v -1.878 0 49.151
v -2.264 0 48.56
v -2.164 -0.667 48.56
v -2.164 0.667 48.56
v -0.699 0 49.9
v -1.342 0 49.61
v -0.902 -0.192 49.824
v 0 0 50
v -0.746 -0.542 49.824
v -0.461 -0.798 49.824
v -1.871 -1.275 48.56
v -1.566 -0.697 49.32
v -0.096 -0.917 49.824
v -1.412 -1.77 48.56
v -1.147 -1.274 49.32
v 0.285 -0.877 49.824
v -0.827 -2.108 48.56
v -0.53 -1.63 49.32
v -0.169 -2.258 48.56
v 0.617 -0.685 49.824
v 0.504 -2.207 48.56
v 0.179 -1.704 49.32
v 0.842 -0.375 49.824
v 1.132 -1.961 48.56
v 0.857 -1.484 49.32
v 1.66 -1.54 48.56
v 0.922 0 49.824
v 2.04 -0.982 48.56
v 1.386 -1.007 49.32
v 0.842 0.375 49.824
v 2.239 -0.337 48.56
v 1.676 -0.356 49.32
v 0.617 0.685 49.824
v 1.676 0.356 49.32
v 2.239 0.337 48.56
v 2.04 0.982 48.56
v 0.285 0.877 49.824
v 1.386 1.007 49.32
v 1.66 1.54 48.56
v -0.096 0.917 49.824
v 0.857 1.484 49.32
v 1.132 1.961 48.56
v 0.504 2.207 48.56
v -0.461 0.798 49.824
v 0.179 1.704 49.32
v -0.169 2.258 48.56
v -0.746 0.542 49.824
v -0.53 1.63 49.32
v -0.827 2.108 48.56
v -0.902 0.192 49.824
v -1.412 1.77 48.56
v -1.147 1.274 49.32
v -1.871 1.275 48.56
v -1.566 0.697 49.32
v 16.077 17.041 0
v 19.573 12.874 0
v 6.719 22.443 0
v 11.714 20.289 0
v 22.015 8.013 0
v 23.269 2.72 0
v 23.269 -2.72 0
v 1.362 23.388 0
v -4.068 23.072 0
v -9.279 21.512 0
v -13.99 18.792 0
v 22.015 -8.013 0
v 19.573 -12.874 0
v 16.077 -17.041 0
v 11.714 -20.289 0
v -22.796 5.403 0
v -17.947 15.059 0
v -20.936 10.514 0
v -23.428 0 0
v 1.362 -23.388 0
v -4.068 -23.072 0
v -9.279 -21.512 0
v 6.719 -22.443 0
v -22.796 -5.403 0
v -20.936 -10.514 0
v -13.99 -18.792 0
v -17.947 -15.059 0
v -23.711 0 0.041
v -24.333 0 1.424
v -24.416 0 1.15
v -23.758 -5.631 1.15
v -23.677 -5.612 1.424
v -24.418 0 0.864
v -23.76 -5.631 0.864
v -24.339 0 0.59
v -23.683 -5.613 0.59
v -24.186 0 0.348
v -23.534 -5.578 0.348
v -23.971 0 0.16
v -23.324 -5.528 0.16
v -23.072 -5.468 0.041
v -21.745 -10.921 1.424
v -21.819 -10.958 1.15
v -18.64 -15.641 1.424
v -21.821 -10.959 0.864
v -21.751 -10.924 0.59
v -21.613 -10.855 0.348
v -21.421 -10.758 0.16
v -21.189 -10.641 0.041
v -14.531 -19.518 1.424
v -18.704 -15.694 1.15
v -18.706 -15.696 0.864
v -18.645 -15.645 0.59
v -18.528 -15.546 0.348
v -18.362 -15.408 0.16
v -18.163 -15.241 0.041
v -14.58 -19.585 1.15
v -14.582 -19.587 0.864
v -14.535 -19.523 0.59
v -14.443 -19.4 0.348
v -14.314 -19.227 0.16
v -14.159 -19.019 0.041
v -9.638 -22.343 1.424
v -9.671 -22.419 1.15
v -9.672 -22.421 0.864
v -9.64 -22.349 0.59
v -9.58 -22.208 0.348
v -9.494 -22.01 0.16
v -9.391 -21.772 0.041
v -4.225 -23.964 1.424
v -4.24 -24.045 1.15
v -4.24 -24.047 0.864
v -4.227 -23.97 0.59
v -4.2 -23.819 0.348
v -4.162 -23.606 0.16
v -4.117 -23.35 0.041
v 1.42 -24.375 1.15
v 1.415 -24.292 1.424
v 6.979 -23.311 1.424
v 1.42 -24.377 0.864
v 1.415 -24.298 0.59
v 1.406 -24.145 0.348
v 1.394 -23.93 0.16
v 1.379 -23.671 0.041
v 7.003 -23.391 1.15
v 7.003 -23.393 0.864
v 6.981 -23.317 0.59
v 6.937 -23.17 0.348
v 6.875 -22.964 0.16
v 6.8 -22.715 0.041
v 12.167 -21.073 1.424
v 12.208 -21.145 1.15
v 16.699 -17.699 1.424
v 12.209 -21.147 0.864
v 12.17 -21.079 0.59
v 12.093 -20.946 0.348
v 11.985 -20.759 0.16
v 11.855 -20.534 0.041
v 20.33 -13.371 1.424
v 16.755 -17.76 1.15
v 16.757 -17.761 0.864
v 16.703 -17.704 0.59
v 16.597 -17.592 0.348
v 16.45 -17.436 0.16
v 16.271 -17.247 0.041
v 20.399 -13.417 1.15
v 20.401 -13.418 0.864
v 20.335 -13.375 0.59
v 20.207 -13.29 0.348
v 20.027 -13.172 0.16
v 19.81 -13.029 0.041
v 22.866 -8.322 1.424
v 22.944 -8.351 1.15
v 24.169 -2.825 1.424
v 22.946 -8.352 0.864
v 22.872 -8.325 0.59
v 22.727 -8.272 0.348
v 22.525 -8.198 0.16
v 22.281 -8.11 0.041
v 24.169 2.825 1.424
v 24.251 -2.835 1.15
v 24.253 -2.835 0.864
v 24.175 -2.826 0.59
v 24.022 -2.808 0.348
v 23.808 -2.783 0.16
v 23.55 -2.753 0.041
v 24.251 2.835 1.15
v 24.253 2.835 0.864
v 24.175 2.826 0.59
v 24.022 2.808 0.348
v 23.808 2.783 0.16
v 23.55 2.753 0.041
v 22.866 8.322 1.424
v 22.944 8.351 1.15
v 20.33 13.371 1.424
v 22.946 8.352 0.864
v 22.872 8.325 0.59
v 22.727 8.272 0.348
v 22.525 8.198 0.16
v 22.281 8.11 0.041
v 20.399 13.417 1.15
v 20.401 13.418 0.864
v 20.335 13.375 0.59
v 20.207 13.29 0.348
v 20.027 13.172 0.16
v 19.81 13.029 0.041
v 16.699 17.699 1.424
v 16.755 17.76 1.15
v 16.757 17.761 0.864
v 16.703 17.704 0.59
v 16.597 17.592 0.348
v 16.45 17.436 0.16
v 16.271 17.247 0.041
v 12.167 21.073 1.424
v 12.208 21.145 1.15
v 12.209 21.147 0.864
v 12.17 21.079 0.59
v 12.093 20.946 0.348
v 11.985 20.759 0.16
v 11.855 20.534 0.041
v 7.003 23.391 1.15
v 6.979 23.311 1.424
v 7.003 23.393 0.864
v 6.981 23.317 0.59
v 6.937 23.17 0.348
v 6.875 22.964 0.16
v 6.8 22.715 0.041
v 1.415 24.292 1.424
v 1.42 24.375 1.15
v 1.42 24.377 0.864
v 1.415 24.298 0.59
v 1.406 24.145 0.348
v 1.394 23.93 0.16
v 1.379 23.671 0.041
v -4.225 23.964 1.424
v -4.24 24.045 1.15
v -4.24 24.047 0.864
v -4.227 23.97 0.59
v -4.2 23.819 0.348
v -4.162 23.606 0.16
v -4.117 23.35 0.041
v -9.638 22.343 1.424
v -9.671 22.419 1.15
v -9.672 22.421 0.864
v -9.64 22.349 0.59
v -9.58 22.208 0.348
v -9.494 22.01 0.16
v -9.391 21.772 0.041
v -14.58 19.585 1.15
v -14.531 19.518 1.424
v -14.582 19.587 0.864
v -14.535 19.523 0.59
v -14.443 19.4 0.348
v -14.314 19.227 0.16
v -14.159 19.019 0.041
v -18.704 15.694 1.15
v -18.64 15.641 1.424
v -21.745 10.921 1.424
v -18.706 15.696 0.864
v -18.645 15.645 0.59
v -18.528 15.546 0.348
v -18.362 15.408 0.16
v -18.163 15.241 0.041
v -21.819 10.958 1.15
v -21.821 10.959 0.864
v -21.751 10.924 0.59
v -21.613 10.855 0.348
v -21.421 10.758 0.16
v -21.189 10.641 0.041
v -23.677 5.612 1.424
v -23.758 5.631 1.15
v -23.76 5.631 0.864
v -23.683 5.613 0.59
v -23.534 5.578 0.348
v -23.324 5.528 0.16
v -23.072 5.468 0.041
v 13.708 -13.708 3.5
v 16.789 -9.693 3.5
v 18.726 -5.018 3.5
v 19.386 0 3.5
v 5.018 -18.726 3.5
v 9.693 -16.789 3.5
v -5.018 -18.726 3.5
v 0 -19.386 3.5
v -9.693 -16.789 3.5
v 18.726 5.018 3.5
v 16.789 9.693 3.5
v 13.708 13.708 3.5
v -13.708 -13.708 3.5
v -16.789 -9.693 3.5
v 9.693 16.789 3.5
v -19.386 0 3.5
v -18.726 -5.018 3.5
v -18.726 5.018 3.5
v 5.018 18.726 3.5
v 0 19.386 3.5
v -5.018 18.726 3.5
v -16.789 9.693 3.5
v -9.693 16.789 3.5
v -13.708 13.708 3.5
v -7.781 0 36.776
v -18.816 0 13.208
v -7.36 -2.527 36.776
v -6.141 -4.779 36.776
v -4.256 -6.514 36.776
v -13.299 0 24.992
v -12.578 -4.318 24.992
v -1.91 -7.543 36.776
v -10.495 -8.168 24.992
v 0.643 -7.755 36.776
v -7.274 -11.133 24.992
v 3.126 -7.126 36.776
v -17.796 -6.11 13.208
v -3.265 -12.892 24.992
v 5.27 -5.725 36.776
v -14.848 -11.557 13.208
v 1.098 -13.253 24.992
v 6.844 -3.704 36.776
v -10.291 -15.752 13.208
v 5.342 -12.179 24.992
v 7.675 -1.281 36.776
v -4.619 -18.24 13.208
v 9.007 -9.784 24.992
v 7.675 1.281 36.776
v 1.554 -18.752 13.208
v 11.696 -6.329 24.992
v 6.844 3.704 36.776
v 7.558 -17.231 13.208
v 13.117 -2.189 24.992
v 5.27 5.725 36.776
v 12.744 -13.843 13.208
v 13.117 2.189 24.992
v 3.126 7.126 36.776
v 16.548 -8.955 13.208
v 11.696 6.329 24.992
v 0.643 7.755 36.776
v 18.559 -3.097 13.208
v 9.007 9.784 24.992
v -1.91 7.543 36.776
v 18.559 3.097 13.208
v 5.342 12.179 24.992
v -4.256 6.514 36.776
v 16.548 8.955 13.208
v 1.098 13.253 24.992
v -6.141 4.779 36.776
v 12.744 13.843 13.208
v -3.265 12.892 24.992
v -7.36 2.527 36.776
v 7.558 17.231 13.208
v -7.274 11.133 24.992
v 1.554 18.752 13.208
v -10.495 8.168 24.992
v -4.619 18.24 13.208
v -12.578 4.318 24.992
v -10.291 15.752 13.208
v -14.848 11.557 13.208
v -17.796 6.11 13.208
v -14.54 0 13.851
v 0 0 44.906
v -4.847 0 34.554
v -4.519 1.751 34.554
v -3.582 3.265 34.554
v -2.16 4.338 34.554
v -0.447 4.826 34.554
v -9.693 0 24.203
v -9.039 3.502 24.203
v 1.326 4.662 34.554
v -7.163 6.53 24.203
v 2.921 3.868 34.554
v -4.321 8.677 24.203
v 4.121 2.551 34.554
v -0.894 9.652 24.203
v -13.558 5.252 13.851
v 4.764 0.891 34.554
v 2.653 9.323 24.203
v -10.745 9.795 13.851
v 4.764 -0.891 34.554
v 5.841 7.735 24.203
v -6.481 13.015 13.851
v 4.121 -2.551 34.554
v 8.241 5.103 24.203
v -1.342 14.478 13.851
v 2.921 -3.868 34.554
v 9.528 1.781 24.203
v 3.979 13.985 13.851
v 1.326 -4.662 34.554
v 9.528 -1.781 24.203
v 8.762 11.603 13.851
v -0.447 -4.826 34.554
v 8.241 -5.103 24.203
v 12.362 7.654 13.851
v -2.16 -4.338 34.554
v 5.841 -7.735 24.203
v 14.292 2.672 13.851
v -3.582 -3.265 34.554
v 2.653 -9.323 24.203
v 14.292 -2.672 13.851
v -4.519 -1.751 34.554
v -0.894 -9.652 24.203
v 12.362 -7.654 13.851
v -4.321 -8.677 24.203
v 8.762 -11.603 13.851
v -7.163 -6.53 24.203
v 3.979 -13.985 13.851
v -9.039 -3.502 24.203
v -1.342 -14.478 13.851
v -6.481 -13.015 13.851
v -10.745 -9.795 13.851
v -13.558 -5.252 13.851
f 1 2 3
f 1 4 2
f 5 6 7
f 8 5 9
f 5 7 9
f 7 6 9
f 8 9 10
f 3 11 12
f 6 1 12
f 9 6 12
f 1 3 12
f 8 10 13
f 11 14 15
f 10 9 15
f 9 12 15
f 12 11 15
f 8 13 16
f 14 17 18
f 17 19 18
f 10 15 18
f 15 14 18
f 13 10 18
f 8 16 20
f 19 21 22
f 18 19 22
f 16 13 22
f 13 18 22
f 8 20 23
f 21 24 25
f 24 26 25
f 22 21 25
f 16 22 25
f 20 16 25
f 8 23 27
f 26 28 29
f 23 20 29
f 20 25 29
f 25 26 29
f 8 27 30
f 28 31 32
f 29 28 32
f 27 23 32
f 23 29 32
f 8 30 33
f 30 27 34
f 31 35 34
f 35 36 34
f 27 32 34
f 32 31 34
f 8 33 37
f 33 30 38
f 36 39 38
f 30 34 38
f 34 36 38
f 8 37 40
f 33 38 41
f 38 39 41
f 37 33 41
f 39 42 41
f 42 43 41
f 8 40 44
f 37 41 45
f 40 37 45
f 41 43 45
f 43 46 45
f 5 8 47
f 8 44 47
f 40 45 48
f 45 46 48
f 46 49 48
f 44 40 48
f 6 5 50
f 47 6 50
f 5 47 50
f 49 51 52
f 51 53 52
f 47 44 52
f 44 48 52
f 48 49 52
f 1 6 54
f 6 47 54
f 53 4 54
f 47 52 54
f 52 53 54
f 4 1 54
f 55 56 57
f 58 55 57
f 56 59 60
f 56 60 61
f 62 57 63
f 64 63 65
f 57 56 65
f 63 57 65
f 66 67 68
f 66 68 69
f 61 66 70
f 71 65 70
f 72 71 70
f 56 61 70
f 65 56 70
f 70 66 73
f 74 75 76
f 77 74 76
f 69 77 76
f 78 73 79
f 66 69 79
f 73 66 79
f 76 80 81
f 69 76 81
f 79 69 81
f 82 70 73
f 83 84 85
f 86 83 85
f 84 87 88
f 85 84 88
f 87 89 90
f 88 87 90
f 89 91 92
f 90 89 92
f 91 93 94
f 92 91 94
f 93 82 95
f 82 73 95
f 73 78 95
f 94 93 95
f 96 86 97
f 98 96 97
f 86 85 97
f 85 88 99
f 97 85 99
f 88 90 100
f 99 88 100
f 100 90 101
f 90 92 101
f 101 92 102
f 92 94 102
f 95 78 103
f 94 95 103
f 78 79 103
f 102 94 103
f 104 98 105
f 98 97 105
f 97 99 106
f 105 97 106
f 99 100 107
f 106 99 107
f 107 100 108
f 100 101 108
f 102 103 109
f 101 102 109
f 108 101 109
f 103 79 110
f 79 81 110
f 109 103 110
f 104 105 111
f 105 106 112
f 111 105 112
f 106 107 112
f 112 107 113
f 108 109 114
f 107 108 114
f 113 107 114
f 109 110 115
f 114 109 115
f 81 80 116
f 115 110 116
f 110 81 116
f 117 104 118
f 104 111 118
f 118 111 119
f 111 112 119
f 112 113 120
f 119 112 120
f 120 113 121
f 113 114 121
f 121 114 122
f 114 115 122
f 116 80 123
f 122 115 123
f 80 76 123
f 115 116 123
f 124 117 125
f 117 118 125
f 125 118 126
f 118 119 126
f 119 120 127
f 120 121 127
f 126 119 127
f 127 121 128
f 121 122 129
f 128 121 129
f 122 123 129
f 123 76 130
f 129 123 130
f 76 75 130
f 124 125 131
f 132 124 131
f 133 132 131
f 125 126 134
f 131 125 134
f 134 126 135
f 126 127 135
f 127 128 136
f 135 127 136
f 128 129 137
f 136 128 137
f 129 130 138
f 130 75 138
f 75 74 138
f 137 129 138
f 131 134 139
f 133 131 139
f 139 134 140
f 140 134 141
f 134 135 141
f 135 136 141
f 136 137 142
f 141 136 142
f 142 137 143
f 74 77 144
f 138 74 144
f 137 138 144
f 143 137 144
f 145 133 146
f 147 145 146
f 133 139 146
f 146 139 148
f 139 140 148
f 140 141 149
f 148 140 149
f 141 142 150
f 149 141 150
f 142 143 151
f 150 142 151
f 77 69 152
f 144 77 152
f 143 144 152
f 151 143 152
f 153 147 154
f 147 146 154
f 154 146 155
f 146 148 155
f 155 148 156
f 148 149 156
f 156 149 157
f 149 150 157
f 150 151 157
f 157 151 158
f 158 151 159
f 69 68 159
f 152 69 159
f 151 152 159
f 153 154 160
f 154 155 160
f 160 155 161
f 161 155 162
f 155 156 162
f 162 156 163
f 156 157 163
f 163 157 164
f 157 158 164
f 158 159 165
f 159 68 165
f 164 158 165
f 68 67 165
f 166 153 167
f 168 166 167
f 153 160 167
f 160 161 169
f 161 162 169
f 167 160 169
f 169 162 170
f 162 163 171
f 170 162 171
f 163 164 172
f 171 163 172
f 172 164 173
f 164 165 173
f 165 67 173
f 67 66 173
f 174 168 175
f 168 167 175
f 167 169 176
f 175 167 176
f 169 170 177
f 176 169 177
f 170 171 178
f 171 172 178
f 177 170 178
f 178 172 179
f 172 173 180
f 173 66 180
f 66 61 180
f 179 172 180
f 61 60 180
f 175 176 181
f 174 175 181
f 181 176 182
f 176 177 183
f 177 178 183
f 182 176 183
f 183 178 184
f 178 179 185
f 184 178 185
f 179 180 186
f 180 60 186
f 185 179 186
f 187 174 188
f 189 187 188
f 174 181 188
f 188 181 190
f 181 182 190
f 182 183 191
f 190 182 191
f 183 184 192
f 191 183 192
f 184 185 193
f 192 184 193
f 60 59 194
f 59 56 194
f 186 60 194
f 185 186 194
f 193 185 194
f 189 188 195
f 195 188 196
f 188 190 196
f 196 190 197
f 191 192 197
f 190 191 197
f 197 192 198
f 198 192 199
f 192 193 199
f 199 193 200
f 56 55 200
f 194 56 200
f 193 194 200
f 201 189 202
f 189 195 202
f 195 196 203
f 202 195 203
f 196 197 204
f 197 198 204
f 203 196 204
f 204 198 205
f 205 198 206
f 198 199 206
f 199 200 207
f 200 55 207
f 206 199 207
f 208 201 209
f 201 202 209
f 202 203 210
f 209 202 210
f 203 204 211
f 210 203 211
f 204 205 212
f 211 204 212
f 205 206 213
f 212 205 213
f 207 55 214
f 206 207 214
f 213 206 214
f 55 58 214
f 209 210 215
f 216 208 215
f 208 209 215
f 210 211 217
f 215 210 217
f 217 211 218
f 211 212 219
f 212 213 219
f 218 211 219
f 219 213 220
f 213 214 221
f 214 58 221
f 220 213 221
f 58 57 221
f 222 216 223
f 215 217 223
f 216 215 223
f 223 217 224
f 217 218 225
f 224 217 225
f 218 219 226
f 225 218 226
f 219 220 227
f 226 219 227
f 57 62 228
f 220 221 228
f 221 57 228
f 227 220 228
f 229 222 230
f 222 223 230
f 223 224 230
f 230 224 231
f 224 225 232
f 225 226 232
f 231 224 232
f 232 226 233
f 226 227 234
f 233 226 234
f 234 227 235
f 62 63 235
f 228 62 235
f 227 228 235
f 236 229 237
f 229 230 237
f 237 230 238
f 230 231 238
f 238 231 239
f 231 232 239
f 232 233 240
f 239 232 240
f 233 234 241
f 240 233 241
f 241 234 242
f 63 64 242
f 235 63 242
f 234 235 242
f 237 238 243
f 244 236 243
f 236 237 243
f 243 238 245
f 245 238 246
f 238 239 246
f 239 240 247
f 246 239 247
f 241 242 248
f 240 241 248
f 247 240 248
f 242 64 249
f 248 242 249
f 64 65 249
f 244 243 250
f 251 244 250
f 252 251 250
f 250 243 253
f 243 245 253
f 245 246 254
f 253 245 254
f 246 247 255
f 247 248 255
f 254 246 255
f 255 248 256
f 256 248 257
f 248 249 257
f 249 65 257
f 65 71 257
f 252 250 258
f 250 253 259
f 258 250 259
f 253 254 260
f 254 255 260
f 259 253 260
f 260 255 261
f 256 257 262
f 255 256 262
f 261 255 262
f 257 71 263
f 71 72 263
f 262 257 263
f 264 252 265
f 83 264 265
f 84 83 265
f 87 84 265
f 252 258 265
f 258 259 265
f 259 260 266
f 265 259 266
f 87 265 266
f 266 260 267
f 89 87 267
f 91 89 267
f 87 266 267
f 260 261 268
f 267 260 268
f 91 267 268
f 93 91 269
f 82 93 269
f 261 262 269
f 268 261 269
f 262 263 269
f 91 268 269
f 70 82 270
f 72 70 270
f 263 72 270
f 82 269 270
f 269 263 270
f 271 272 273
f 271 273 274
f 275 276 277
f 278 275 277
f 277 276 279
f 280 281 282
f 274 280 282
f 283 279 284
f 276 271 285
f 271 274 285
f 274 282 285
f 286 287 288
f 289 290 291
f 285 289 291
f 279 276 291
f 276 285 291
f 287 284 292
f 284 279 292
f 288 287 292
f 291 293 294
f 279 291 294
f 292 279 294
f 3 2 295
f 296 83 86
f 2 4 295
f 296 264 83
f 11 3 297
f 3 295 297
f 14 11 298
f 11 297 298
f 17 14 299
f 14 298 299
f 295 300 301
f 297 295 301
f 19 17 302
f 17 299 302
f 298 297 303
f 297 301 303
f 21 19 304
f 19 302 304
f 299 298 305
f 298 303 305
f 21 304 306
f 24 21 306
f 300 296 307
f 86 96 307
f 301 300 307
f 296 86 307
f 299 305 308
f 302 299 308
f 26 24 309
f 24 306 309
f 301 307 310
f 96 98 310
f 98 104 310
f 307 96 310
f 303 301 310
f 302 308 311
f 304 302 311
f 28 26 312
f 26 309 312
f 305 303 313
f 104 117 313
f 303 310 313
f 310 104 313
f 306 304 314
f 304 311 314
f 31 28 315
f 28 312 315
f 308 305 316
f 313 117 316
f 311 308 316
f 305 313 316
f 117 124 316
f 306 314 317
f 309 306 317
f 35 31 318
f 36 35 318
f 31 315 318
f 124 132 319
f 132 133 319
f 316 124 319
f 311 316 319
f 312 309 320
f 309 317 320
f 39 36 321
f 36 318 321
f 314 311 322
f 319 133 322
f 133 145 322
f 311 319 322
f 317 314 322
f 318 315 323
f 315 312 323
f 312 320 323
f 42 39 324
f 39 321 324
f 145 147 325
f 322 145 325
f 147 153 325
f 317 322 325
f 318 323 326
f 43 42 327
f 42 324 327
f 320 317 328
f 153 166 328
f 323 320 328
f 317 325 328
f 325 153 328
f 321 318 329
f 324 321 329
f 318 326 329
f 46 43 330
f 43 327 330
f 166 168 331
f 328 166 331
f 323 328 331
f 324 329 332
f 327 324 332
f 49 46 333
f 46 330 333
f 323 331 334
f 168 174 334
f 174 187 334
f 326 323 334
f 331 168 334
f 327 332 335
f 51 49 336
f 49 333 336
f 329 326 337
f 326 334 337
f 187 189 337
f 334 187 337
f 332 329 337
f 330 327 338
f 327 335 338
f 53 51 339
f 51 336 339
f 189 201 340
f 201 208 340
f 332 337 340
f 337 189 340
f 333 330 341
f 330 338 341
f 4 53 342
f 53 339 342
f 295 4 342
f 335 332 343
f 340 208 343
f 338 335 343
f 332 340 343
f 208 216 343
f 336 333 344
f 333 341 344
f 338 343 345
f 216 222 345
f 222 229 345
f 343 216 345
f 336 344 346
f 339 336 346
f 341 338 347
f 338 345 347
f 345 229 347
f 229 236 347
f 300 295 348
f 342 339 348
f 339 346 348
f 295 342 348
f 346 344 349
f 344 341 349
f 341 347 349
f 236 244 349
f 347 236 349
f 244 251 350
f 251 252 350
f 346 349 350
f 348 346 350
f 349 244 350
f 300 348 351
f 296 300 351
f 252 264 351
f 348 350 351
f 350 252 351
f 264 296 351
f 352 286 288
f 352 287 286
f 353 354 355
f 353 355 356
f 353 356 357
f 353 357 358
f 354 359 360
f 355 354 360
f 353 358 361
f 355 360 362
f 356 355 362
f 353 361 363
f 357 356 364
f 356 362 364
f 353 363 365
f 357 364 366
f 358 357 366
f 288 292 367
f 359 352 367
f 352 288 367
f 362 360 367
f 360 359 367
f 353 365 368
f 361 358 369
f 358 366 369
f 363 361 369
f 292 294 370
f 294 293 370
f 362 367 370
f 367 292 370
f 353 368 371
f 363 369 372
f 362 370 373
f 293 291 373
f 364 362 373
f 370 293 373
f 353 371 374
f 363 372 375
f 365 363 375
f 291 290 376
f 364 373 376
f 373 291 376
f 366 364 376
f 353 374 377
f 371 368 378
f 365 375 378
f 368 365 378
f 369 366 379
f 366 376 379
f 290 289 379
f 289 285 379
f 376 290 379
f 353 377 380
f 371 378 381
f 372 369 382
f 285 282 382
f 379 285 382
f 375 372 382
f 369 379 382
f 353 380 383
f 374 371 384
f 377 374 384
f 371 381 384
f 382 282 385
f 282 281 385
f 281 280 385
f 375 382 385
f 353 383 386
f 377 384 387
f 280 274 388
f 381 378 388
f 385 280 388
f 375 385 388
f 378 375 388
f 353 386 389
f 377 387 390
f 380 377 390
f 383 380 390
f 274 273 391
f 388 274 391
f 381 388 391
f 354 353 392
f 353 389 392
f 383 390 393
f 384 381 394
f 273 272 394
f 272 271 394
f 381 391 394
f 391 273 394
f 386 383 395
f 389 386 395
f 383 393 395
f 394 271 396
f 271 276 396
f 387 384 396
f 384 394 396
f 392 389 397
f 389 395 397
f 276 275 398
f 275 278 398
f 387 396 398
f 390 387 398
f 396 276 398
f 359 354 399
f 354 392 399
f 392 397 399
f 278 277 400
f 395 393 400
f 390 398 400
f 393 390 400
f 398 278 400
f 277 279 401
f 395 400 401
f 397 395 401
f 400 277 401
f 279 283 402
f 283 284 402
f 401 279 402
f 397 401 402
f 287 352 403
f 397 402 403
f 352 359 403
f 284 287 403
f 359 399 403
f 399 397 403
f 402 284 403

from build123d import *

# Parameters (mm, degrees)
F2_R = 1


with BuildPart() as f1:
    # F0 (on Front) → F1 (revolve)
    with BuildSketch(Plane.XZ):
        with BuildLine():
            ThreePointArc((0, 50), (-1.34161, 49.609522), (-2.264125, 48.560066))
            Line((-2.264125, 48.560066), (-25, 0))
            Line((-25, 0), (0, 0))
            Line((0, 0), (0, 50))
        make_face()
    revolve(axis=Axis((0, 0, 26.697931), (0, 0, 1)))

    # F2
    f2_edges = [f1.edges().sort_by_distance(p)[0] for p in [
        (25, 0, 0),
    ]]
    fillet(f2_edges, radius=F2_R)

    # F3 (on Front) → F4 (revolve, cut)
    with BuildSketch(Plane.XZ):
        Polygon((0, 3.5), (0, 44.905821), (-19.38625, 3.5), align=None)
    revolve(axis=Axis((0, 0, 24.883967), (0, 0, -1)), mode=Mode.SUBTRACT)


solid = f1.part
